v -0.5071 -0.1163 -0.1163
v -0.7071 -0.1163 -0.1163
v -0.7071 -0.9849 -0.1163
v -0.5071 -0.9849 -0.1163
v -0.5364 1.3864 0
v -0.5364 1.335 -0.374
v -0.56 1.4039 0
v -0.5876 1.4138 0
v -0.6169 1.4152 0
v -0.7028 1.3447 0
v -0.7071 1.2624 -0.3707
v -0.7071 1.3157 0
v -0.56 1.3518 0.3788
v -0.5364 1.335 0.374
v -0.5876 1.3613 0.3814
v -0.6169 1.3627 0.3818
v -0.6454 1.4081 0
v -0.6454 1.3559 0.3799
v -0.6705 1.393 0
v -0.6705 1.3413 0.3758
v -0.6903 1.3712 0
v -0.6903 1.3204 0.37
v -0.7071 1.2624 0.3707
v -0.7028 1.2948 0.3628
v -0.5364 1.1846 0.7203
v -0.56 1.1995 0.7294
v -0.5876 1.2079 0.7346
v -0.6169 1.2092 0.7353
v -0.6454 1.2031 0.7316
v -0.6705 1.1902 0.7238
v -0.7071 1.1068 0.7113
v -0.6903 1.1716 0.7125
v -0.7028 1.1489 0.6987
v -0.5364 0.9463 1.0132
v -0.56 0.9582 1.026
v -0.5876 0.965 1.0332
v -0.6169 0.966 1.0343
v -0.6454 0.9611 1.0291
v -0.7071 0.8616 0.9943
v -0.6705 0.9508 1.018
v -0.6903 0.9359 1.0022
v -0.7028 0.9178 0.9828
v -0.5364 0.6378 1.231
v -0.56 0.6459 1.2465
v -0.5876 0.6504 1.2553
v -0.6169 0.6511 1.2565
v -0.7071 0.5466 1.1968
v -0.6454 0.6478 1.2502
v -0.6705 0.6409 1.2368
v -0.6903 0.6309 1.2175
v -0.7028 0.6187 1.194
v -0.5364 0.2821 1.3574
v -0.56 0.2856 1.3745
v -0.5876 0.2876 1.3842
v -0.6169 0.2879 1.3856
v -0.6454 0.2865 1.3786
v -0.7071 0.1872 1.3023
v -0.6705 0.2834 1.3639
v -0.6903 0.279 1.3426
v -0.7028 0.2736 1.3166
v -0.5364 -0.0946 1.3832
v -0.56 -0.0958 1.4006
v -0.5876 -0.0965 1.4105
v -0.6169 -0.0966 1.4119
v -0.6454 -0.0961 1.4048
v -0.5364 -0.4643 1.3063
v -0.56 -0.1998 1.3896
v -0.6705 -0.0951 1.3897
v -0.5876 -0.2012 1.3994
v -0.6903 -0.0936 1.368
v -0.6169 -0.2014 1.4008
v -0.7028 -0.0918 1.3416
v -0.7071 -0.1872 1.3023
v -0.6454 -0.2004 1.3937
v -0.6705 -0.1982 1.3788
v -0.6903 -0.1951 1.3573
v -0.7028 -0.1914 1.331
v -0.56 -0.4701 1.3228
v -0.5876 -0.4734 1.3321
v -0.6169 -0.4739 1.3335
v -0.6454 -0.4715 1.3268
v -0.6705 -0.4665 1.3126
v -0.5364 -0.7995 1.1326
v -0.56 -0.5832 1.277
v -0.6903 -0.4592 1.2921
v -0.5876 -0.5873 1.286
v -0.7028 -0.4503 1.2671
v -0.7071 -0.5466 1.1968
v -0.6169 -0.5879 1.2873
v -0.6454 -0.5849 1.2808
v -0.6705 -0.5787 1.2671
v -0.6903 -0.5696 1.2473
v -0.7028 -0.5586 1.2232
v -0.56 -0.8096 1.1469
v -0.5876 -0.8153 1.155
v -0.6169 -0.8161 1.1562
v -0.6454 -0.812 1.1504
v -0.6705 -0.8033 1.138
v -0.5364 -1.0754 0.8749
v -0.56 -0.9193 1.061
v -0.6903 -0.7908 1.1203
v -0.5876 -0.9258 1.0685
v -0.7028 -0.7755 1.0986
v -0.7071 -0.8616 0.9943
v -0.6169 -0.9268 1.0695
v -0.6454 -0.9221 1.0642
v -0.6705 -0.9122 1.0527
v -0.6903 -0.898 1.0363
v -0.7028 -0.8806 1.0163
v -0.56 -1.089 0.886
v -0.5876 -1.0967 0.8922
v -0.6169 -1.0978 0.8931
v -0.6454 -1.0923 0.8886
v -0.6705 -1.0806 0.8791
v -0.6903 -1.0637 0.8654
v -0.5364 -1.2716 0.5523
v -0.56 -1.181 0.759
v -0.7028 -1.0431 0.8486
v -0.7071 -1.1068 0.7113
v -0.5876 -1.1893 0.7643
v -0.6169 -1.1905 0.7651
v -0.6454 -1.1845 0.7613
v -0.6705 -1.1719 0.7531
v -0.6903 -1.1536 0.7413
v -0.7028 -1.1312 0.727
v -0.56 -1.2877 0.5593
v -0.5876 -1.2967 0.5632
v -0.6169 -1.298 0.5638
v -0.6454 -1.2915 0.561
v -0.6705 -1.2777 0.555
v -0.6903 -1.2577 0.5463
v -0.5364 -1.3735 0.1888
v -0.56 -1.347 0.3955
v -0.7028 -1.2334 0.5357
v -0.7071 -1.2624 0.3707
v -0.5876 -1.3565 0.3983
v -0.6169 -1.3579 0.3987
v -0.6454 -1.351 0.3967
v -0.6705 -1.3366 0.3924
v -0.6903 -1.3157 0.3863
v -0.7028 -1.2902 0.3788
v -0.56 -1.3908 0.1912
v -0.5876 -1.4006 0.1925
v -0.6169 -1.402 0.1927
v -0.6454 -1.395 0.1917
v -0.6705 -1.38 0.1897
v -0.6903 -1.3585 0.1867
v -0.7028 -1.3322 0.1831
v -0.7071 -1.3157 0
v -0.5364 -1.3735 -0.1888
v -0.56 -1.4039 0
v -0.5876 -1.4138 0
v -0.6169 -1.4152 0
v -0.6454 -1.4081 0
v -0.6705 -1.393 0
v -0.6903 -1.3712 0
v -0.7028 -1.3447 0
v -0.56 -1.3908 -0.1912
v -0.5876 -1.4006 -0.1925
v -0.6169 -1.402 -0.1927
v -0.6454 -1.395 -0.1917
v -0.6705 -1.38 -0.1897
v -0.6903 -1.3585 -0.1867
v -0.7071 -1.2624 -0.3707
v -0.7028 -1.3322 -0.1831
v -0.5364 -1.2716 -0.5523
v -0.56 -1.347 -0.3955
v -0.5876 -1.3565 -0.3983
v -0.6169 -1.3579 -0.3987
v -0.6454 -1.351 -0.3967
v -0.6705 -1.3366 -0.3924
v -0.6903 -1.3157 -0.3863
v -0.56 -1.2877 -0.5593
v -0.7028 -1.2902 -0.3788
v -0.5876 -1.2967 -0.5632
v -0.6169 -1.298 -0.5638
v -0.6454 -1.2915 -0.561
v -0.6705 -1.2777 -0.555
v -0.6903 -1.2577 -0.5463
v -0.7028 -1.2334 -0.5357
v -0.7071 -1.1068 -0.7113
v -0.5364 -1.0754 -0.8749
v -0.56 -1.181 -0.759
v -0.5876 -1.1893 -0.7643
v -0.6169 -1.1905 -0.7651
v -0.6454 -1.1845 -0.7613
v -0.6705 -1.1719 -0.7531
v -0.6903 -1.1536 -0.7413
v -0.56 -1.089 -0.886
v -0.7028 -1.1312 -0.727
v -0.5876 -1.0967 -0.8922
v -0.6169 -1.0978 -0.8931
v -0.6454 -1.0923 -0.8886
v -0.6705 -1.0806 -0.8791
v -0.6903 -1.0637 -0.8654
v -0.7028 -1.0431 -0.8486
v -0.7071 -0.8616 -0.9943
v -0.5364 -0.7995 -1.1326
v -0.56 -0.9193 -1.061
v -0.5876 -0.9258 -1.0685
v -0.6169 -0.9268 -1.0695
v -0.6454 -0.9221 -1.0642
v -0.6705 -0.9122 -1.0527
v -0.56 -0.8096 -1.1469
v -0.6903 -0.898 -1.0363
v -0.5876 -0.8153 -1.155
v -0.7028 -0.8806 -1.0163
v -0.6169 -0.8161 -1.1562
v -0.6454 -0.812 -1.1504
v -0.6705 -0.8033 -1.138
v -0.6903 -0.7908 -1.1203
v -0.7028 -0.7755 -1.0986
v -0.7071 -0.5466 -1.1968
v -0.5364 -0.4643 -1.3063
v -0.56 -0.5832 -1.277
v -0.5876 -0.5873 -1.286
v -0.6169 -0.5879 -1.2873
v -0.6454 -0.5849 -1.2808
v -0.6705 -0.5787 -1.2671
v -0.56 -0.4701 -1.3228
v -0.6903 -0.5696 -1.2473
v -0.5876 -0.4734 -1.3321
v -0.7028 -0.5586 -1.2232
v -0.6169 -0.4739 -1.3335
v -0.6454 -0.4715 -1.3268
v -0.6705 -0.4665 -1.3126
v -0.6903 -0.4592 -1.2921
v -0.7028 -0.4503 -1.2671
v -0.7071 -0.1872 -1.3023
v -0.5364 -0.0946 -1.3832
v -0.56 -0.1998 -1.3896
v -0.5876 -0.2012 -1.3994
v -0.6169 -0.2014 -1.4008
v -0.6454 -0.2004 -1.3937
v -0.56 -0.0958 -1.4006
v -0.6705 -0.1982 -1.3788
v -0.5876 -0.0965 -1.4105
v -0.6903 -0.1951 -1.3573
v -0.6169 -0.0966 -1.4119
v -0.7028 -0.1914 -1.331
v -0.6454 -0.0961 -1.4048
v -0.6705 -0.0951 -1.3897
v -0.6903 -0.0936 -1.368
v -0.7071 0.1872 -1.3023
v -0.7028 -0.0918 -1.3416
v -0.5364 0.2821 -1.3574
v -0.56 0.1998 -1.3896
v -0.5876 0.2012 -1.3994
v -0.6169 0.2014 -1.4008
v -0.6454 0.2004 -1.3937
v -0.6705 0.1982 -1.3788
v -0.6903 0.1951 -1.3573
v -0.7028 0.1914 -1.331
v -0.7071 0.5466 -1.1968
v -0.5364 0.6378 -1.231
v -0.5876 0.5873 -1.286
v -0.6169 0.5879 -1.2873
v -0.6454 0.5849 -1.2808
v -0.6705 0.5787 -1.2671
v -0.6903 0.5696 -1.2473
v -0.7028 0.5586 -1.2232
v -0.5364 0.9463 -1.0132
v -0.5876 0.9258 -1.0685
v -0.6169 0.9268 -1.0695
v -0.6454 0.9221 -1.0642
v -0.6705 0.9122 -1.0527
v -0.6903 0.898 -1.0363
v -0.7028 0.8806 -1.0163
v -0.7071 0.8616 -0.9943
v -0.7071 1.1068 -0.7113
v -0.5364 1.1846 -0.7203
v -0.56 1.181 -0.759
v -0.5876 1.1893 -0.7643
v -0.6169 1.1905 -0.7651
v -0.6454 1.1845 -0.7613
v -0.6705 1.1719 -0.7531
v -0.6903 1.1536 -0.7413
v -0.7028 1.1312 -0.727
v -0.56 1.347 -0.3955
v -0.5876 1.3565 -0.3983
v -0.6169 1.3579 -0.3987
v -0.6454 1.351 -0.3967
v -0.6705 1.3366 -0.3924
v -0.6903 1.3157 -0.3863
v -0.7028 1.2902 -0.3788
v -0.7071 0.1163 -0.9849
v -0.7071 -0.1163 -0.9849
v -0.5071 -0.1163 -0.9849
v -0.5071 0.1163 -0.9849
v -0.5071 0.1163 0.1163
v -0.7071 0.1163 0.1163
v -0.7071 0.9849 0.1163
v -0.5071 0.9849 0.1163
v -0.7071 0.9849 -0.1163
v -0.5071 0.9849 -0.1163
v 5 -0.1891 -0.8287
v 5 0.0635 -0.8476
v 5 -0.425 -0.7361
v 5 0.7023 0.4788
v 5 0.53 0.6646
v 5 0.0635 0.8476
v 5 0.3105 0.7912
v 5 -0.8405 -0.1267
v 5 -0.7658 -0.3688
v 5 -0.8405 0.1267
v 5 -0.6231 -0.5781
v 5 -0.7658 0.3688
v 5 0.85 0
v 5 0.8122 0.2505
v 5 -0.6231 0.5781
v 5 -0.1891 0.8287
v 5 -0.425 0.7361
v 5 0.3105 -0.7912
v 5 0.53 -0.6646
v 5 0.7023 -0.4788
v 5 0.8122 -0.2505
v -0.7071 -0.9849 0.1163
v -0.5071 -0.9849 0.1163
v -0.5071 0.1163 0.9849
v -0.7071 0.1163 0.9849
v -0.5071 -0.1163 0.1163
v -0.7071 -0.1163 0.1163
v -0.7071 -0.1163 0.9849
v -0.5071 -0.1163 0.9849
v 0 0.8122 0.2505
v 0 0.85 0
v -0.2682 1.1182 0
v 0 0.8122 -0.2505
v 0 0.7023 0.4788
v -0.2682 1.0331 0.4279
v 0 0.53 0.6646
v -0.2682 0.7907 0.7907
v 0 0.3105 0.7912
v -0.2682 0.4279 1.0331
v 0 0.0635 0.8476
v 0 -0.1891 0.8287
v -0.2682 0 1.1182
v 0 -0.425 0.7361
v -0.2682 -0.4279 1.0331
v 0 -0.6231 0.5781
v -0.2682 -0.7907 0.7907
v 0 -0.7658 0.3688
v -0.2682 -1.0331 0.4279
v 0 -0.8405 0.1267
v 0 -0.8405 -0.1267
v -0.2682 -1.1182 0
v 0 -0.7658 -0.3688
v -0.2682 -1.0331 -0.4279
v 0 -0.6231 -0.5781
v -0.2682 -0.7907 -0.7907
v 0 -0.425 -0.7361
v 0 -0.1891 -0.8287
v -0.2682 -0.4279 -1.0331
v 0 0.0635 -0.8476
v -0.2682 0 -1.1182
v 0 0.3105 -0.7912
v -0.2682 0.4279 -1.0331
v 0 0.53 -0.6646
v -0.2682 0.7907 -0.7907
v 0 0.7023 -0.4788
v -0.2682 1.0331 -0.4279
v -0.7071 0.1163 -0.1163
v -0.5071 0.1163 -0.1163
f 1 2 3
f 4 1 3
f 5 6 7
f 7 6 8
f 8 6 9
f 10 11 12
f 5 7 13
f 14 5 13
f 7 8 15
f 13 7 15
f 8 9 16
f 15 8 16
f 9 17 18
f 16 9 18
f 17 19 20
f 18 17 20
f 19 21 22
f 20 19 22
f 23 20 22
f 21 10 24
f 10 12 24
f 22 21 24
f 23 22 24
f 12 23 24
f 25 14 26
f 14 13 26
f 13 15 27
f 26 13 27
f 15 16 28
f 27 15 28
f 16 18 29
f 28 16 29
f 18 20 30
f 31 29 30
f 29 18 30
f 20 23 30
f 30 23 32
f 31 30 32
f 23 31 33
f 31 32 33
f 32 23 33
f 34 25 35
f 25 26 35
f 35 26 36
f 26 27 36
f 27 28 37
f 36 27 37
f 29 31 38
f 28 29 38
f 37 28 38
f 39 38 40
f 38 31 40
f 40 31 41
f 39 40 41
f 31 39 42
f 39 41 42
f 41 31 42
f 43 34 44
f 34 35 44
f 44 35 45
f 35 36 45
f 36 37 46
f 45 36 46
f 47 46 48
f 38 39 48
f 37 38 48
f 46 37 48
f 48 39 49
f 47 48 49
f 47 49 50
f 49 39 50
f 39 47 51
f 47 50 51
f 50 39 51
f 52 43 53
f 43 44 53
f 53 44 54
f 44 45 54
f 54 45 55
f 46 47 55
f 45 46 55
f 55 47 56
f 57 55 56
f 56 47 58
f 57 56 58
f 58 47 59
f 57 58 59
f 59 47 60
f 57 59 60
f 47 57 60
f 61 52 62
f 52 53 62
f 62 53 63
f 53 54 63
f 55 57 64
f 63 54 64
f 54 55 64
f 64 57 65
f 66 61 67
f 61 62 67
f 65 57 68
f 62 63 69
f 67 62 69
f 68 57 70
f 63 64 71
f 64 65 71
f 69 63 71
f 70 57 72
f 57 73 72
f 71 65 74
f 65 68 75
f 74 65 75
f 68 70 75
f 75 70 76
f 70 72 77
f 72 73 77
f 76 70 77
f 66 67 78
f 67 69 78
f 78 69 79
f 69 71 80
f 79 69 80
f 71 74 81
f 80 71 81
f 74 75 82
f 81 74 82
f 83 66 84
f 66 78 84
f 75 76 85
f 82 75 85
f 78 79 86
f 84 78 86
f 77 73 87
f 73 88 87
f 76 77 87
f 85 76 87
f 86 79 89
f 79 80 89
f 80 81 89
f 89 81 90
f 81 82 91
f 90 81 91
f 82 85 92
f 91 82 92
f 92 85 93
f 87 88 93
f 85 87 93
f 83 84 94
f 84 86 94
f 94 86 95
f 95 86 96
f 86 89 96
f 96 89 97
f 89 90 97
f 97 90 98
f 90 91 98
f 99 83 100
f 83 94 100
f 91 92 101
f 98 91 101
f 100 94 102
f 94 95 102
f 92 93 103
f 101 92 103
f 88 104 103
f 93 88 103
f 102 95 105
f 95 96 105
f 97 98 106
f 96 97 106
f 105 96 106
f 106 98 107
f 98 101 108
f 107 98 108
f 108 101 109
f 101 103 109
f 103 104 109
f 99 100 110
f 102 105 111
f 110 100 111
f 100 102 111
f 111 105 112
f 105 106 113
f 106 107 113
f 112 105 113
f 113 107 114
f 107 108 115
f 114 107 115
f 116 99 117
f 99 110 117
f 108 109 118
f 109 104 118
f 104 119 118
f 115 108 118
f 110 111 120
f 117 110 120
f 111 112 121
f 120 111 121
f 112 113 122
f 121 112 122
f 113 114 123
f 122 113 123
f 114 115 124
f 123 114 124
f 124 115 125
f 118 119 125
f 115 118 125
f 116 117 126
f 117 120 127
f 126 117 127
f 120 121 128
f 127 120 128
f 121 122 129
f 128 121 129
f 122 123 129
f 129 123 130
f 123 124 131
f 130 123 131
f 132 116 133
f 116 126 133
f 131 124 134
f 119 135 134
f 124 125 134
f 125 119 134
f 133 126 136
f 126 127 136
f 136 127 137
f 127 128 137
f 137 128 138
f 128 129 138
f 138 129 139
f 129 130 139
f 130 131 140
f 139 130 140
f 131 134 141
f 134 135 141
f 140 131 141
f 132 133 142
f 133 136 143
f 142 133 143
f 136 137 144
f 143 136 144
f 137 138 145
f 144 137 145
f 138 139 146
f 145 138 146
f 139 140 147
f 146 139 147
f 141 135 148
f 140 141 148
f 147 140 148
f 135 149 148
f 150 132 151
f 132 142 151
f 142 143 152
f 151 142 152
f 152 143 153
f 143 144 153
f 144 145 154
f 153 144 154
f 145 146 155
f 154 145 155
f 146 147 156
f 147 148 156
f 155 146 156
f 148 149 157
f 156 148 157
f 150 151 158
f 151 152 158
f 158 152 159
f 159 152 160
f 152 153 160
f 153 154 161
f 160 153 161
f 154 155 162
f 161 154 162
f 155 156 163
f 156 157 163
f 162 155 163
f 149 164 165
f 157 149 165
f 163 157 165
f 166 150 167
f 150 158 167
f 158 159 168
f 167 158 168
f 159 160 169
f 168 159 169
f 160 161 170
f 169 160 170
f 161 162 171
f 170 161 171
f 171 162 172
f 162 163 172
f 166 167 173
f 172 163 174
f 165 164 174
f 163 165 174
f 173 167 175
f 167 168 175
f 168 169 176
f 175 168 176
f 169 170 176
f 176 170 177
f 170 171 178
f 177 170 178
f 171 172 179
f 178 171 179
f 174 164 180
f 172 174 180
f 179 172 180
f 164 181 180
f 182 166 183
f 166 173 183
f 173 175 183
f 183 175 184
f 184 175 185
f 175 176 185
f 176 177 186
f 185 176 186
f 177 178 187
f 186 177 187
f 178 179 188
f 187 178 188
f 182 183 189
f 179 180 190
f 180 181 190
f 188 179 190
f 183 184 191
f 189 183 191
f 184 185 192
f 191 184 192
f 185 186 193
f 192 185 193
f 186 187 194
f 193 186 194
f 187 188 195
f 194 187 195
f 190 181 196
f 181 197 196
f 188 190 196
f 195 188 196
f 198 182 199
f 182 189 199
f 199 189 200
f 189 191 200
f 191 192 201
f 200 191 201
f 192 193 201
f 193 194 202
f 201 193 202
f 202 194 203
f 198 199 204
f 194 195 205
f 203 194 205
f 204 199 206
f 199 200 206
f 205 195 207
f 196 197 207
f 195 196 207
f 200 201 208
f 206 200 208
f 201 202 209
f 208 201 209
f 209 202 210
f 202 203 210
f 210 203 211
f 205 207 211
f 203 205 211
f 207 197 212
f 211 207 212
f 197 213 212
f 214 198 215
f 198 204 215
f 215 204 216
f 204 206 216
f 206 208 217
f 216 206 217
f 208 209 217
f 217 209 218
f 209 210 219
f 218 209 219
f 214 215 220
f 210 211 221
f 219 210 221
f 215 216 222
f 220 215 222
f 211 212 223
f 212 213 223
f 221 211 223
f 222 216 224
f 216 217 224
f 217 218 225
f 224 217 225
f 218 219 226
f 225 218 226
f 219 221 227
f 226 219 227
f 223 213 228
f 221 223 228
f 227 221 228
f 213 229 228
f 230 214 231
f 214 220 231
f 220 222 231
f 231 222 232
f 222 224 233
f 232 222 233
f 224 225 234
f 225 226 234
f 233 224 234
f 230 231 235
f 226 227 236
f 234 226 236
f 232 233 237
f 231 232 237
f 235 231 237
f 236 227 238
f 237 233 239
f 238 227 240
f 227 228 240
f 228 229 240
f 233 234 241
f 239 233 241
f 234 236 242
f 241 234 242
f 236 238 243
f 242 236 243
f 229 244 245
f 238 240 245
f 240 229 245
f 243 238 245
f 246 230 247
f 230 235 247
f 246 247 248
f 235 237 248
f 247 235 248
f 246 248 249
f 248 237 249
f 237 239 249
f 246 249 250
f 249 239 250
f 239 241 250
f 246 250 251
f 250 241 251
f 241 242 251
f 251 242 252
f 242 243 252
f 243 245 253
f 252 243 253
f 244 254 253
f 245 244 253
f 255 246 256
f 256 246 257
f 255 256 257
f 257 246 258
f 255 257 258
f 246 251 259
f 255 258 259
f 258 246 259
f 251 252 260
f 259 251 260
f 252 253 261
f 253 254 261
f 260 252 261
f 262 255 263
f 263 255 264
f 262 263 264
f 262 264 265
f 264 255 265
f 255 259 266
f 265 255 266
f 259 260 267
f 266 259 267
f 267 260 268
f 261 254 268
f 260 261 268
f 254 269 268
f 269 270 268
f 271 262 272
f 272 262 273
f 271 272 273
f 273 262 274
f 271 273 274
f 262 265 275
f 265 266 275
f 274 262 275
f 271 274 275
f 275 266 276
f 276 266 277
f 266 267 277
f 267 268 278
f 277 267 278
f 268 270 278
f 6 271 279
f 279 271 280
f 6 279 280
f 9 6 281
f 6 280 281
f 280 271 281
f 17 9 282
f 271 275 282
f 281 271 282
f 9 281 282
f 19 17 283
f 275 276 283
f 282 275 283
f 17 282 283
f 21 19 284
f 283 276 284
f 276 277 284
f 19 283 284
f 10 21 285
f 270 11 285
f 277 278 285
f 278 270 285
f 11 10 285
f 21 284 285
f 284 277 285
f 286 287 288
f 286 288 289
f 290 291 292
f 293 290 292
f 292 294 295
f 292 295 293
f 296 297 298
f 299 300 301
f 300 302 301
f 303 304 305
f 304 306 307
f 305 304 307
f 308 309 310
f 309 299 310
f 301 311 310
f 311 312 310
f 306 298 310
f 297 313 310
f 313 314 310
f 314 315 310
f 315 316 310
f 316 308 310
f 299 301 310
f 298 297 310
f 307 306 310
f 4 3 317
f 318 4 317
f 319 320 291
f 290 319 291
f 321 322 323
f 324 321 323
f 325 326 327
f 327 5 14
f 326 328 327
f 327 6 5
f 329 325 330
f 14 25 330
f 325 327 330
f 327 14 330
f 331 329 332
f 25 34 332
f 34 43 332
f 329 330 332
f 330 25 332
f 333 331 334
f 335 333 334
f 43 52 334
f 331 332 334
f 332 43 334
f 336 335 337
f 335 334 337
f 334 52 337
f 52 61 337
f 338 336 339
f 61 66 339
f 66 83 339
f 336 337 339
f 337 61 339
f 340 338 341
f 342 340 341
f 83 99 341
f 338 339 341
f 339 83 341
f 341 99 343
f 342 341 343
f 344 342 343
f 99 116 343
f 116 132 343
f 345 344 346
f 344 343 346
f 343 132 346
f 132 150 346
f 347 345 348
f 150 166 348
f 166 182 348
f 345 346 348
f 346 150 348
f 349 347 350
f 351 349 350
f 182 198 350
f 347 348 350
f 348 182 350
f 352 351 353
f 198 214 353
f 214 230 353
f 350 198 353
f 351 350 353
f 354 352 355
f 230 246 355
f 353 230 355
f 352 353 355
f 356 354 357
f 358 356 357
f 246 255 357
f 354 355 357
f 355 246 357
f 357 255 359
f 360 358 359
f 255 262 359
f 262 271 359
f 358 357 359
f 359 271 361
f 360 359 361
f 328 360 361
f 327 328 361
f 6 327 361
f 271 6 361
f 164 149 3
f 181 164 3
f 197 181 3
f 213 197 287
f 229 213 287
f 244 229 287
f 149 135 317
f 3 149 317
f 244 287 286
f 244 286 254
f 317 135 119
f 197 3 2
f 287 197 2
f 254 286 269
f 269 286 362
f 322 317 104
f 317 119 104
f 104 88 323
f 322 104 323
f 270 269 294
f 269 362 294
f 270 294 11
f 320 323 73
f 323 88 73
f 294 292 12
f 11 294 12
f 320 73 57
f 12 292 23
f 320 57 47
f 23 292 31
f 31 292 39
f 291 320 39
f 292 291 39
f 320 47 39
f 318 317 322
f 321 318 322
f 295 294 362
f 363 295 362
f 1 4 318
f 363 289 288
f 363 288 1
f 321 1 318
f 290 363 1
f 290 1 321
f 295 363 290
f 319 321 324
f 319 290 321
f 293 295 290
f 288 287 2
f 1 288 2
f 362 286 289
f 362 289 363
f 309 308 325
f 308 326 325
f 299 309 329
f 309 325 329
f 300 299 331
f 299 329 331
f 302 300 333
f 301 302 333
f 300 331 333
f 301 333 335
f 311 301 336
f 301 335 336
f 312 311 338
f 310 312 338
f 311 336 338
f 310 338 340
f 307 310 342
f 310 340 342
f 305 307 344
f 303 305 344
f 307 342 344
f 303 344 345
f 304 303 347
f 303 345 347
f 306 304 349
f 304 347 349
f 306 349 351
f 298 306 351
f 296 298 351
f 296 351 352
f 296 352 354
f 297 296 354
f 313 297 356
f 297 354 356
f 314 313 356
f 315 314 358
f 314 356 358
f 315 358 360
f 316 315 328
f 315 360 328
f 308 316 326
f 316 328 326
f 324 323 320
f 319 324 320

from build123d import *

# Parameters (mm, degrees)
SKETCH_2_W          = 0.232618696
SKETCH_2_H          = 0.868598709
SKETCH_2_W_2        = 0.868598709
SKETCH_2_H_2        = 0.232618696
CUT_EXTRUDE_1_DEPTH = 0.2
FILLET_1_R          = 0.1


with BuildPart() as part:
    # 草图1 → 旋转2 (revolve)
    with BuildSketch(Plane.XY):
        Polygon((-0.707106781, 0), (5, 0), (5, 0.85), (0, 0.85), (-0.707106781, 1.557106781), align=None)
    revolve(axis=Axis((-0.707106781, 0, 0), (1, 0, 0)))

    # 草图2 → 切除-拉伸1 (cut)
    with BuildSketch(Plane.ZY.offset(0.707106781)):
        with Locations((0, -0.550608703)):
            Rectangle(SKETCH_2_W, SKETCH_2_H)
        with Locations((0.550608703, 0)):
            Rectangle(SKETCH_2_W_2, SKETCH_2_H_2)
        Rectangle(SKETCH_2_W, SKETCH_2_H_2)
        with Locations((0, 0.550608703)):
            Rectangle(SKETCH_2_W, SKETCH_2_H)
        with Locations((-0.550608703, 0)):
            Rectangle(SKETCH_2_W_2, SKETCH_2_H_2)
    extrude(amount=-CUT_EXTRUDE_1_DEPTH, mode=Mode.SUBTRACT)

    # 圆角1
    fillet_1_edges = [part.edges().sort_by_distance(p)[0] for p in [
        (-0.707106781, -1.557106781, 0),
    ]]
    fillet(fillet_1_edges, radius=FILLET_1_R)


solid = part.part
